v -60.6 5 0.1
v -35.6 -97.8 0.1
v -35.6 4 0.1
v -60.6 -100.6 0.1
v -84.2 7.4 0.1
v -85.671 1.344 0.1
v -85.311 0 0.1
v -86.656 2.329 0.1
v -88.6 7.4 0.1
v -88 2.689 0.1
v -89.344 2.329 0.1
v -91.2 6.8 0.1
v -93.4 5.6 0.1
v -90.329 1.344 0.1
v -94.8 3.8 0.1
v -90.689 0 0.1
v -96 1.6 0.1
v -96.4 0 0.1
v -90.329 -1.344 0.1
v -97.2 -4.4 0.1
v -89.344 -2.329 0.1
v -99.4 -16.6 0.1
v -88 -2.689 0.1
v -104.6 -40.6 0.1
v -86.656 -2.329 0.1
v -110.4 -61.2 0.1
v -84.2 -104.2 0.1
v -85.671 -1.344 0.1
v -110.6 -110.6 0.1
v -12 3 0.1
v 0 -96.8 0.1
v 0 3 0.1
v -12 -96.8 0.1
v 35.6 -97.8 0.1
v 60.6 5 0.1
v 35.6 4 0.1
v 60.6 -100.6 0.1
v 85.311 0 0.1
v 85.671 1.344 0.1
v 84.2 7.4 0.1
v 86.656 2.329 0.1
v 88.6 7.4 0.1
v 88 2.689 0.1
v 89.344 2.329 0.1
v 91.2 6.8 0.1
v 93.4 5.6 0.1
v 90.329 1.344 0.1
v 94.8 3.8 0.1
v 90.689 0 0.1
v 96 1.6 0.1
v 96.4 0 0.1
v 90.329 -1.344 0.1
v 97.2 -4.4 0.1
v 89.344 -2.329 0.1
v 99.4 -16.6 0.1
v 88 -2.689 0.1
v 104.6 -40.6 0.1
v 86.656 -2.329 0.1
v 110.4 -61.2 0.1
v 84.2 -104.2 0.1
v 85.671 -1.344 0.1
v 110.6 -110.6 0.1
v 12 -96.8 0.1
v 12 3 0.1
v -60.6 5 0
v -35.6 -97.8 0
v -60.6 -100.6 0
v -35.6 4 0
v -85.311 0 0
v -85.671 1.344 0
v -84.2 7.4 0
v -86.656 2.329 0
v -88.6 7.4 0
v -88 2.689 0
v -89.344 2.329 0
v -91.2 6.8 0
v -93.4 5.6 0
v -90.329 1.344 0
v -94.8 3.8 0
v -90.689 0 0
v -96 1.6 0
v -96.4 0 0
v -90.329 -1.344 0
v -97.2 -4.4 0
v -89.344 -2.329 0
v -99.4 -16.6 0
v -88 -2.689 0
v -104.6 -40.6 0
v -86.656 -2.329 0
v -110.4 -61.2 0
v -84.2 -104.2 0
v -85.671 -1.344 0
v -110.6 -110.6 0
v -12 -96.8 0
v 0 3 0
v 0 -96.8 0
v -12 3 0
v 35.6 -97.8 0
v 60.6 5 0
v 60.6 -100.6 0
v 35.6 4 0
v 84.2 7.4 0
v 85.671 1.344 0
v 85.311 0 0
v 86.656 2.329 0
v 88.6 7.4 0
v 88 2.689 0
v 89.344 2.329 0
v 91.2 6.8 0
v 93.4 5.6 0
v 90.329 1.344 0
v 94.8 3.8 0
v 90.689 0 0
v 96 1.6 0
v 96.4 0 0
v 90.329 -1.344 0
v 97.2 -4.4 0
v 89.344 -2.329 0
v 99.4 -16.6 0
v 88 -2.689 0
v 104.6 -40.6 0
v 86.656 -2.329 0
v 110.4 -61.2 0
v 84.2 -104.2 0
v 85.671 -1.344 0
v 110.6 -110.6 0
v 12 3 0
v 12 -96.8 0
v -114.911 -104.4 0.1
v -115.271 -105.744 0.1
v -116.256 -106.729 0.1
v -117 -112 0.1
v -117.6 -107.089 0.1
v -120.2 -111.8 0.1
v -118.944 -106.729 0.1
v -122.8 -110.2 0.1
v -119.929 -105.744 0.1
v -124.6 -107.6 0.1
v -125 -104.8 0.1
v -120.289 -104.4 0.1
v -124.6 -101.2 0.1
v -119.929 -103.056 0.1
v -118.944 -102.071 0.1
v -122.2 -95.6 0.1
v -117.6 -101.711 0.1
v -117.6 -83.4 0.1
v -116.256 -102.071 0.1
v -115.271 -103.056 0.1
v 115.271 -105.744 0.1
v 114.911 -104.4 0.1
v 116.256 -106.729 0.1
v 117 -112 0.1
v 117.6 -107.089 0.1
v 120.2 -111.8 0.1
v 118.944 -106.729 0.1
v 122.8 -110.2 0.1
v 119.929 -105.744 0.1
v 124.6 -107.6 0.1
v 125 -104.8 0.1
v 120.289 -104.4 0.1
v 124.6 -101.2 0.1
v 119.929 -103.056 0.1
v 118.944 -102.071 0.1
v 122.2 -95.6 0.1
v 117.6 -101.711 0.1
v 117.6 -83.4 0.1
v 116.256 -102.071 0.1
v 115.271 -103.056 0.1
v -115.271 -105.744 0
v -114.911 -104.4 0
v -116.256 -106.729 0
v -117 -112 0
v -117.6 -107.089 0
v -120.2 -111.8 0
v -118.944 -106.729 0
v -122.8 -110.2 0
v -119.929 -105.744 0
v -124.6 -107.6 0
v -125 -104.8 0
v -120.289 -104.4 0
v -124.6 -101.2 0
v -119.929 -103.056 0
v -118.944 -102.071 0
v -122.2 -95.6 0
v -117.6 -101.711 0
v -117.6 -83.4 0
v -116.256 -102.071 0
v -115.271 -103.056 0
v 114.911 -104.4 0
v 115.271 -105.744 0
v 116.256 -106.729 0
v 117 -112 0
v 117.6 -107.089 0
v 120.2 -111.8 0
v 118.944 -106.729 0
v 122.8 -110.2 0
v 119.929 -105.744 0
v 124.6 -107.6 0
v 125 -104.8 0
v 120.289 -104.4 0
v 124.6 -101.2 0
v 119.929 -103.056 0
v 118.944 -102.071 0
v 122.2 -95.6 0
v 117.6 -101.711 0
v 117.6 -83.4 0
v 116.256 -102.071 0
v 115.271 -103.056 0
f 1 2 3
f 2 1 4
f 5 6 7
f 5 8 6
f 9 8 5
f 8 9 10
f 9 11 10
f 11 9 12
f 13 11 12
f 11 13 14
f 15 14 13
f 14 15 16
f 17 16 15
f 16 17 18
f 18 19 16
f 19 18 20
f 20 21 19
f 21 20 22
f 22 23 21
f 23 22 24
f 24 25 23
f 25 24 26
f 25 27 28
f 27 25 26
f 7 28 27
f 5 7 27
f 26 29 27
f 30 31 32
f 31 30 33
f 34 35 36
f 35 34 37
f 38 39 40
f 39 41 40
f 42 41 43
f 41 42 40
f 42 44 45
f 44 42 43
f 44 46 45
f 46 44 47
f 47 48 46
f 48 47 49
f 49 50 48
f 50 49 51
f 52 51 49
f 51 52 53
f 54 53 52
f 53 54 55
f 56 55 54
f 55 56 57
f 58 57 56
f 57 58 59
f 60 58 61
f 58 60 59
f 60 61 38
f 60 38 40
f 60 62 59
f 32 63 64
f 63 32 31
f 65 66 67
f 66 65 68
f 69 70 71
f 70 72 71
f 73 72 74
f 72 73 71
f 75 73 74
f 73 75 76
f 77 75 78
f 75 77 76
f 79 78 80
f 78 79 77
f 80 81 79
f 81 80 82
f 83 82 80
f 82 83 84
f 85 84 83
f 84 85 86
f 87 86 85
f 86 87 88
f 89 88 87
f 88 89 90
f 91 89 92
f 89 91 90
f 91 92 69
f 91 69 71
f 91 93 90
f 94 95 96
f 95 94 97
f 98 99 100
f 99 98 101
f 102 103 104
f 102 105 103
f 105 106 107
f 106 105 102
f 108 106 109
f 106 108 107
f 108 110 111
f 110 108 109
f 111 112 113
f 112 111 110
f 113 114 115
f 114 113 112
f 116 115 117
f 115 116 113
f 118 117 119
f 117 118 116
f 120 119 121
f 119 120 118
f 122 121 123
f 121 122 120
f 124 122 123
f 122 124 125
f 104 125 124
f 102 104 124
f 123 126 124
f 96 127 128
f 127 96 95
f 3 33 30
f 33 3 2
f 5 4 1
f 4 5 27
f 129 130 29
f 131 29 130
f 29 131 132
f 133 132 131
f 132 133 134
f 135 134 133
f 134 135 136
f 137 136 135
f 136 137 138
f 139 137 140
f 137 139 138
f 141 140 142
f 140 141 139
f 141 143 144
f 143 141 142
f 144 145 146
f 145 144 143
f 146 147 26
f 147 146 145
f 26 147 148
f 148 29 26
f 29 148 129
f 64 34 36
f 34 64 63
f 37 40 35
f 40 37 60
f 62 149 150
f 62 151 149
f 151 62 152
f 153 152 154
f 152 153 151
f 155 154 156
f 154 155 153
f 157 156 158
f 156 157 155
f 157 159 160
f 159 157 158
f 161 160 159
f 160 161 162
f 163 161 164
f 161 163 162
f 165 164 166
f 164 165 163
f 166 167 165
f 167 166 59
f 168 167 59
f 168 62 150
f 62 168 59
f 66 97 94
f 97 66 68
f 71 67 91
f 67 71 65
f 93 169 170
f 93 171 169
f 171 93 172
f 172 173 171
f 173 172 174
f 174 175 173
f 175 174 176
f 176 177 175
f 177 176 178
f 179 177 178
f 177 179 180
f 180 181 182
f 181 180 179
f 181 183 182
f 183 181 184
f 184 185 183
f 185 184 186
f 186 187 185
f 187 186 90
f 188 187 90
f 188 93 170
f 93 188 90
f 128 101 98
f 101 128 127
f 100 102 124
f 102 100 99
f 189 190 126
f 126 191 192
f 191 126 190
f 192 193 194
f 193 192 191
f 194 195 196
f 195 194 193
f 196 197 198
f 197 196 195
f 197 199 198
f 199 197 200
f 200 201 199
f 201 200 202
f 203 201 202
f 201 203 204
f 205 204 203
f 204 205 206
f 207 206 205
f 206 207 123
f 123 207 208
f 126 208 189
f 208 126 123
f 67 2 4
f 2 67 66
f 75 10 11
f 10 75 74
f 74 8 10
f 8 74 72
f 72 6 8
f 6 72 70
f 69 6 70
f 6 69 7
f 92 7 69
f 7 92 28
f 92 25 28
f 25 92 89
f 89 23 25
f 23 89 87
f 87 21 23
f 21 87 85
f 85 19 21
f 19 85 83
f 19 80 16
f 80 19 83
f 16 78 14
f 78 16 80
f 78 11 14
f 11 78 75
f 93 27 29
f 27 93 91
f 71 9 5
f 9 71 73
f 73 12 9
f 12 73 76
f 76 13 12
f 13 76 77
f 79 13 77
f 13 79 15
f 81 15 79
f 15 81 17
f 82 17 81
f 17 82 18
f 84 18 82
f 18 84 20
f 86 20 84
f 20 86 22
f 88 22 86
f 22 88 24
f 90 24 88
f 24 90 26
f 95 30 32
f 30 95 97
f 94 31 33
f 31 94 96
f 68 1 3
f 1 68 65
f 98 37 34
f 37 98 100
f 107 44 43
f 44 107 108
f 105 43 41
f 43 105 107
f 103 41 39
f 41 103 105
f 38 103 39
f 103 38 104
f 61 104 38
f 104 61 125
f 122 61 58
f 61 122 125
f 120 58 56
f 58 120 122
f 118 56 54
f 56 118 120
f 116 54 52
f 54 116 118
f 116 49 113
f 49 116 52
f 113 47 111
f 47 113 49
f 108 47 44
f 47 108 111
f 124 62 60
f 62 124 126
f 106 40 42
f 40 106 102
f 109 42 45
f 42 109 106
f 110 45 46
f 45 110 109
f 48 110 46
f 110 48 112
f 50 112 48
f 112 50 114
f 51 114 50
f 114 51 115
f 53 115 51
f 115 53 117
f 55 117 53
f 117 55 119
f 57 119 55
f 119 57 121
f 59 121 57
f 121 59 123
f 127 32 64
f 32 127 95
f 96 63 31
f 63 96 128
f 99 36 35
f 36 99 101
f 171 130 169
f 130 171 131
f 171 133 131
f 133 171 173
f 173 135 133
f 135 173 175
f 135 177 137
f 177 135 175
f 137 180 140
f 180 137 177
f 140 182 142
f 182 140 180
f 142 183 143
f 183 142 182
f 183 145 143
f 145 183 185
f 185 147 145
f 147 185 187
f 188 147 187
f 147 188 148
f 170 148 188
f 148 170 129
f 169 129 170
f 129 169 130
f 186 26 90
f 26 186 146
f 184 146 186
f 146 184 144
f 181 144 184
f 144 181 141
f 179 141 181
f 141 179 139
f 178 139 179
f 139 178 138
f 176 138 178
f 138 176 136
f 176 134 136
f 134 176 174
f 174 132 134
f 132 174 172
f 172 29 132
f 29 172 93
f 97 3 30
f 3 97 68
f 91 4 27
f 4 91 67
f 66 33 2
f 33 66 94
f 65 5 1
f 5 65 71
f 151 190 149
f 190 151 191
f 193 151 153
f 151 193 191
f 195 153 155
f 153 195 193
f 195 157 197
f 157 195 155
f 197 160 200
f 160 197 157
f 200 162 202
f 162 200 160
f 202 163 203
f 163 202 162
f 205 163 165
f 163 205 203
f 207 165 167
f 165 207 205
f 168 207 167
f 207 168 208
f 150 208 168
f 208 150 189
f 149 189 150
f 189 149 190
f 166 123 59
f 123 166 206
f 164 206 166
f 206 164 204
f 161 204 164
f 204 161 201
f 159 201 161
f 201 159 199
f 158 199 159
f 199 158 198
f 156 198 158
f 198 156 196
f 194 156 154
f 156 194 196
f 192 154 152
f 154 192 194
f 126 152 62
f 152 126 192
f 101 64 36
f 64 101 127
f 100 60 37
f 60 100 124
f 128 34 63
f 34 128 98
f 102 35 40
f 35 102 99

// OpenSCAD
use <../lib.scad>
use <s/u9495s01.scad>
use <s/u9495s02.scad>
use <s/u9495s03.scad>
use <s/u9495s04.scad>
$fa=1; $fs=0.2;
function ldraw_lib__u9495(realsolid=false) = [
// 0 Sheet Fabric 30 x 15 Trapezoidal Sail
// 0 Name: u9495.dat
// 0 Author: Philippe Hurbain [Philo]
// 0 !LDRAW_ORG Part UPDATE 2022-03
// 0 !LICENSE Licensed under CC BY 2.0 and CC BY 4.0 : see CAreadme.txt
// 
// 0 BFC CERTIFY CCW
  [0,"BFC","CERTIFY"],
  [0,"BFC","CCW"],
// 
// 0 !CATEGORY Sheet Fabric
// 
// 0 !HISTORY 2022-05-07 [PTadmin] Official Update 2022-03
// 
// 
// 1 16 0 -0.25 0 1 0 0 0 1 0 0 0 1 s\u9495s01.dat
  [1,16,0,-0.25,0,1,0,0,0,1,0,0,0,1, ldraw_lib__s__u9495s01(realsolid)],
// 1 16 0 -0.25 0 -1 0 0 0 1 0 0 0 1 s\u9495s01.dat
  [1,16,0,-0.25,0,-1,0,0,0,1,0,0,0,1, ldraw_lib__s__u9495s01(realsolid)],
// 1 16 0 0 0 1 0 0 0 -1 0 0 0 1 s\u9495s01.dat
  [1,16,0,0,0,1,0,0,0,-1,0,0,0,1, ldraw_lib__s__u9495s01(realsolid)],
// 1 16 0 0 0 -1 0 0 0 -1 0 0 0 1 s\u9495s01.dat
  [1,16,0,0,0,-1,0,0,0,-1,0,0,0,1, ldraw_lib__s__u9495s01(realsolid)],
// 
// 1 16 0 -0.25 0 1 0 0 0 1 0 0 0 1 s\u9495s02.dat
  [1,16,0,-0.25,0,1,0,0,0,1,0,0,0,1, ldraw_lib__s__u9495s02(realsolid)],
// 1 16 0 -0.25 0 -1 0 0 0 1 0 0 0 1 s\u9495s02.dat
  [1,16,0,-0.25,0,-1,0,0,0,1,0,0,0,1, ldraw_lib__s__u9495s02(realsolid)],
// 1 16 0 0 0 1 0 0 0 -1 0 0 0 1 s\u9495s02.dat
  [1,16,0,0,0,1,0,0,0,-1,0,0,0,1, ldraw_lib__s__u9495s02(realsolid)],
// 1 16 0 0 0 -1 0 0 0 -1 0 0 0 1 s\u9495s02.dat
  [1,16,0,0,0,-1,0,0,0,-1,0,0,0,1, ldraw_lib__s__u9495s02(realsolid)],
// 
// 1 16 0 0 0 1 0 0 0 1 0 0 0 1 s\u9495s03.dat
  [1,16,0,0,0,1,0,0,0,1,0,0,0,1, ldraw_lib__s__u9495s03(realsolid)],
// 1 16 0 0 0 -1 0 0 0 1 0 0 0 1 s\u9495s03.dat
  [1,16,0,0,0,-1,0,0,0,1,0,0,0,1, ldraw_lib__s__u9495s03(realsolid)],
// 
// 1 16 0 0 0 1 0 0 0 1 0 0 0 1 s\u9495s04.dat
  [1,16,0,0,0,1,0,0,0,1,0,0,0,1, ldraw_lib__s__u9495s04(realsolid)],
// 1 16 0 0 0 -1 0 0 0 1 0 0 0 1 s\u9495s04.dat
  [1,16,0,0,0,-1,0,0,0,1,0,0,0,1, ldraw_lib__s__u9495s04(realsolid)],
];
module ldraw_lib__u9495(step=0, col=false, unit=2/5, alt=false, line=0.2, solid=!$preview)
    makepoly(ldraw_lib__u9495(solid), step=step, col=col, unit=unit, alt=alt, line=line, solid=solid);
ldraw_lib__u9495(line=0.2);
